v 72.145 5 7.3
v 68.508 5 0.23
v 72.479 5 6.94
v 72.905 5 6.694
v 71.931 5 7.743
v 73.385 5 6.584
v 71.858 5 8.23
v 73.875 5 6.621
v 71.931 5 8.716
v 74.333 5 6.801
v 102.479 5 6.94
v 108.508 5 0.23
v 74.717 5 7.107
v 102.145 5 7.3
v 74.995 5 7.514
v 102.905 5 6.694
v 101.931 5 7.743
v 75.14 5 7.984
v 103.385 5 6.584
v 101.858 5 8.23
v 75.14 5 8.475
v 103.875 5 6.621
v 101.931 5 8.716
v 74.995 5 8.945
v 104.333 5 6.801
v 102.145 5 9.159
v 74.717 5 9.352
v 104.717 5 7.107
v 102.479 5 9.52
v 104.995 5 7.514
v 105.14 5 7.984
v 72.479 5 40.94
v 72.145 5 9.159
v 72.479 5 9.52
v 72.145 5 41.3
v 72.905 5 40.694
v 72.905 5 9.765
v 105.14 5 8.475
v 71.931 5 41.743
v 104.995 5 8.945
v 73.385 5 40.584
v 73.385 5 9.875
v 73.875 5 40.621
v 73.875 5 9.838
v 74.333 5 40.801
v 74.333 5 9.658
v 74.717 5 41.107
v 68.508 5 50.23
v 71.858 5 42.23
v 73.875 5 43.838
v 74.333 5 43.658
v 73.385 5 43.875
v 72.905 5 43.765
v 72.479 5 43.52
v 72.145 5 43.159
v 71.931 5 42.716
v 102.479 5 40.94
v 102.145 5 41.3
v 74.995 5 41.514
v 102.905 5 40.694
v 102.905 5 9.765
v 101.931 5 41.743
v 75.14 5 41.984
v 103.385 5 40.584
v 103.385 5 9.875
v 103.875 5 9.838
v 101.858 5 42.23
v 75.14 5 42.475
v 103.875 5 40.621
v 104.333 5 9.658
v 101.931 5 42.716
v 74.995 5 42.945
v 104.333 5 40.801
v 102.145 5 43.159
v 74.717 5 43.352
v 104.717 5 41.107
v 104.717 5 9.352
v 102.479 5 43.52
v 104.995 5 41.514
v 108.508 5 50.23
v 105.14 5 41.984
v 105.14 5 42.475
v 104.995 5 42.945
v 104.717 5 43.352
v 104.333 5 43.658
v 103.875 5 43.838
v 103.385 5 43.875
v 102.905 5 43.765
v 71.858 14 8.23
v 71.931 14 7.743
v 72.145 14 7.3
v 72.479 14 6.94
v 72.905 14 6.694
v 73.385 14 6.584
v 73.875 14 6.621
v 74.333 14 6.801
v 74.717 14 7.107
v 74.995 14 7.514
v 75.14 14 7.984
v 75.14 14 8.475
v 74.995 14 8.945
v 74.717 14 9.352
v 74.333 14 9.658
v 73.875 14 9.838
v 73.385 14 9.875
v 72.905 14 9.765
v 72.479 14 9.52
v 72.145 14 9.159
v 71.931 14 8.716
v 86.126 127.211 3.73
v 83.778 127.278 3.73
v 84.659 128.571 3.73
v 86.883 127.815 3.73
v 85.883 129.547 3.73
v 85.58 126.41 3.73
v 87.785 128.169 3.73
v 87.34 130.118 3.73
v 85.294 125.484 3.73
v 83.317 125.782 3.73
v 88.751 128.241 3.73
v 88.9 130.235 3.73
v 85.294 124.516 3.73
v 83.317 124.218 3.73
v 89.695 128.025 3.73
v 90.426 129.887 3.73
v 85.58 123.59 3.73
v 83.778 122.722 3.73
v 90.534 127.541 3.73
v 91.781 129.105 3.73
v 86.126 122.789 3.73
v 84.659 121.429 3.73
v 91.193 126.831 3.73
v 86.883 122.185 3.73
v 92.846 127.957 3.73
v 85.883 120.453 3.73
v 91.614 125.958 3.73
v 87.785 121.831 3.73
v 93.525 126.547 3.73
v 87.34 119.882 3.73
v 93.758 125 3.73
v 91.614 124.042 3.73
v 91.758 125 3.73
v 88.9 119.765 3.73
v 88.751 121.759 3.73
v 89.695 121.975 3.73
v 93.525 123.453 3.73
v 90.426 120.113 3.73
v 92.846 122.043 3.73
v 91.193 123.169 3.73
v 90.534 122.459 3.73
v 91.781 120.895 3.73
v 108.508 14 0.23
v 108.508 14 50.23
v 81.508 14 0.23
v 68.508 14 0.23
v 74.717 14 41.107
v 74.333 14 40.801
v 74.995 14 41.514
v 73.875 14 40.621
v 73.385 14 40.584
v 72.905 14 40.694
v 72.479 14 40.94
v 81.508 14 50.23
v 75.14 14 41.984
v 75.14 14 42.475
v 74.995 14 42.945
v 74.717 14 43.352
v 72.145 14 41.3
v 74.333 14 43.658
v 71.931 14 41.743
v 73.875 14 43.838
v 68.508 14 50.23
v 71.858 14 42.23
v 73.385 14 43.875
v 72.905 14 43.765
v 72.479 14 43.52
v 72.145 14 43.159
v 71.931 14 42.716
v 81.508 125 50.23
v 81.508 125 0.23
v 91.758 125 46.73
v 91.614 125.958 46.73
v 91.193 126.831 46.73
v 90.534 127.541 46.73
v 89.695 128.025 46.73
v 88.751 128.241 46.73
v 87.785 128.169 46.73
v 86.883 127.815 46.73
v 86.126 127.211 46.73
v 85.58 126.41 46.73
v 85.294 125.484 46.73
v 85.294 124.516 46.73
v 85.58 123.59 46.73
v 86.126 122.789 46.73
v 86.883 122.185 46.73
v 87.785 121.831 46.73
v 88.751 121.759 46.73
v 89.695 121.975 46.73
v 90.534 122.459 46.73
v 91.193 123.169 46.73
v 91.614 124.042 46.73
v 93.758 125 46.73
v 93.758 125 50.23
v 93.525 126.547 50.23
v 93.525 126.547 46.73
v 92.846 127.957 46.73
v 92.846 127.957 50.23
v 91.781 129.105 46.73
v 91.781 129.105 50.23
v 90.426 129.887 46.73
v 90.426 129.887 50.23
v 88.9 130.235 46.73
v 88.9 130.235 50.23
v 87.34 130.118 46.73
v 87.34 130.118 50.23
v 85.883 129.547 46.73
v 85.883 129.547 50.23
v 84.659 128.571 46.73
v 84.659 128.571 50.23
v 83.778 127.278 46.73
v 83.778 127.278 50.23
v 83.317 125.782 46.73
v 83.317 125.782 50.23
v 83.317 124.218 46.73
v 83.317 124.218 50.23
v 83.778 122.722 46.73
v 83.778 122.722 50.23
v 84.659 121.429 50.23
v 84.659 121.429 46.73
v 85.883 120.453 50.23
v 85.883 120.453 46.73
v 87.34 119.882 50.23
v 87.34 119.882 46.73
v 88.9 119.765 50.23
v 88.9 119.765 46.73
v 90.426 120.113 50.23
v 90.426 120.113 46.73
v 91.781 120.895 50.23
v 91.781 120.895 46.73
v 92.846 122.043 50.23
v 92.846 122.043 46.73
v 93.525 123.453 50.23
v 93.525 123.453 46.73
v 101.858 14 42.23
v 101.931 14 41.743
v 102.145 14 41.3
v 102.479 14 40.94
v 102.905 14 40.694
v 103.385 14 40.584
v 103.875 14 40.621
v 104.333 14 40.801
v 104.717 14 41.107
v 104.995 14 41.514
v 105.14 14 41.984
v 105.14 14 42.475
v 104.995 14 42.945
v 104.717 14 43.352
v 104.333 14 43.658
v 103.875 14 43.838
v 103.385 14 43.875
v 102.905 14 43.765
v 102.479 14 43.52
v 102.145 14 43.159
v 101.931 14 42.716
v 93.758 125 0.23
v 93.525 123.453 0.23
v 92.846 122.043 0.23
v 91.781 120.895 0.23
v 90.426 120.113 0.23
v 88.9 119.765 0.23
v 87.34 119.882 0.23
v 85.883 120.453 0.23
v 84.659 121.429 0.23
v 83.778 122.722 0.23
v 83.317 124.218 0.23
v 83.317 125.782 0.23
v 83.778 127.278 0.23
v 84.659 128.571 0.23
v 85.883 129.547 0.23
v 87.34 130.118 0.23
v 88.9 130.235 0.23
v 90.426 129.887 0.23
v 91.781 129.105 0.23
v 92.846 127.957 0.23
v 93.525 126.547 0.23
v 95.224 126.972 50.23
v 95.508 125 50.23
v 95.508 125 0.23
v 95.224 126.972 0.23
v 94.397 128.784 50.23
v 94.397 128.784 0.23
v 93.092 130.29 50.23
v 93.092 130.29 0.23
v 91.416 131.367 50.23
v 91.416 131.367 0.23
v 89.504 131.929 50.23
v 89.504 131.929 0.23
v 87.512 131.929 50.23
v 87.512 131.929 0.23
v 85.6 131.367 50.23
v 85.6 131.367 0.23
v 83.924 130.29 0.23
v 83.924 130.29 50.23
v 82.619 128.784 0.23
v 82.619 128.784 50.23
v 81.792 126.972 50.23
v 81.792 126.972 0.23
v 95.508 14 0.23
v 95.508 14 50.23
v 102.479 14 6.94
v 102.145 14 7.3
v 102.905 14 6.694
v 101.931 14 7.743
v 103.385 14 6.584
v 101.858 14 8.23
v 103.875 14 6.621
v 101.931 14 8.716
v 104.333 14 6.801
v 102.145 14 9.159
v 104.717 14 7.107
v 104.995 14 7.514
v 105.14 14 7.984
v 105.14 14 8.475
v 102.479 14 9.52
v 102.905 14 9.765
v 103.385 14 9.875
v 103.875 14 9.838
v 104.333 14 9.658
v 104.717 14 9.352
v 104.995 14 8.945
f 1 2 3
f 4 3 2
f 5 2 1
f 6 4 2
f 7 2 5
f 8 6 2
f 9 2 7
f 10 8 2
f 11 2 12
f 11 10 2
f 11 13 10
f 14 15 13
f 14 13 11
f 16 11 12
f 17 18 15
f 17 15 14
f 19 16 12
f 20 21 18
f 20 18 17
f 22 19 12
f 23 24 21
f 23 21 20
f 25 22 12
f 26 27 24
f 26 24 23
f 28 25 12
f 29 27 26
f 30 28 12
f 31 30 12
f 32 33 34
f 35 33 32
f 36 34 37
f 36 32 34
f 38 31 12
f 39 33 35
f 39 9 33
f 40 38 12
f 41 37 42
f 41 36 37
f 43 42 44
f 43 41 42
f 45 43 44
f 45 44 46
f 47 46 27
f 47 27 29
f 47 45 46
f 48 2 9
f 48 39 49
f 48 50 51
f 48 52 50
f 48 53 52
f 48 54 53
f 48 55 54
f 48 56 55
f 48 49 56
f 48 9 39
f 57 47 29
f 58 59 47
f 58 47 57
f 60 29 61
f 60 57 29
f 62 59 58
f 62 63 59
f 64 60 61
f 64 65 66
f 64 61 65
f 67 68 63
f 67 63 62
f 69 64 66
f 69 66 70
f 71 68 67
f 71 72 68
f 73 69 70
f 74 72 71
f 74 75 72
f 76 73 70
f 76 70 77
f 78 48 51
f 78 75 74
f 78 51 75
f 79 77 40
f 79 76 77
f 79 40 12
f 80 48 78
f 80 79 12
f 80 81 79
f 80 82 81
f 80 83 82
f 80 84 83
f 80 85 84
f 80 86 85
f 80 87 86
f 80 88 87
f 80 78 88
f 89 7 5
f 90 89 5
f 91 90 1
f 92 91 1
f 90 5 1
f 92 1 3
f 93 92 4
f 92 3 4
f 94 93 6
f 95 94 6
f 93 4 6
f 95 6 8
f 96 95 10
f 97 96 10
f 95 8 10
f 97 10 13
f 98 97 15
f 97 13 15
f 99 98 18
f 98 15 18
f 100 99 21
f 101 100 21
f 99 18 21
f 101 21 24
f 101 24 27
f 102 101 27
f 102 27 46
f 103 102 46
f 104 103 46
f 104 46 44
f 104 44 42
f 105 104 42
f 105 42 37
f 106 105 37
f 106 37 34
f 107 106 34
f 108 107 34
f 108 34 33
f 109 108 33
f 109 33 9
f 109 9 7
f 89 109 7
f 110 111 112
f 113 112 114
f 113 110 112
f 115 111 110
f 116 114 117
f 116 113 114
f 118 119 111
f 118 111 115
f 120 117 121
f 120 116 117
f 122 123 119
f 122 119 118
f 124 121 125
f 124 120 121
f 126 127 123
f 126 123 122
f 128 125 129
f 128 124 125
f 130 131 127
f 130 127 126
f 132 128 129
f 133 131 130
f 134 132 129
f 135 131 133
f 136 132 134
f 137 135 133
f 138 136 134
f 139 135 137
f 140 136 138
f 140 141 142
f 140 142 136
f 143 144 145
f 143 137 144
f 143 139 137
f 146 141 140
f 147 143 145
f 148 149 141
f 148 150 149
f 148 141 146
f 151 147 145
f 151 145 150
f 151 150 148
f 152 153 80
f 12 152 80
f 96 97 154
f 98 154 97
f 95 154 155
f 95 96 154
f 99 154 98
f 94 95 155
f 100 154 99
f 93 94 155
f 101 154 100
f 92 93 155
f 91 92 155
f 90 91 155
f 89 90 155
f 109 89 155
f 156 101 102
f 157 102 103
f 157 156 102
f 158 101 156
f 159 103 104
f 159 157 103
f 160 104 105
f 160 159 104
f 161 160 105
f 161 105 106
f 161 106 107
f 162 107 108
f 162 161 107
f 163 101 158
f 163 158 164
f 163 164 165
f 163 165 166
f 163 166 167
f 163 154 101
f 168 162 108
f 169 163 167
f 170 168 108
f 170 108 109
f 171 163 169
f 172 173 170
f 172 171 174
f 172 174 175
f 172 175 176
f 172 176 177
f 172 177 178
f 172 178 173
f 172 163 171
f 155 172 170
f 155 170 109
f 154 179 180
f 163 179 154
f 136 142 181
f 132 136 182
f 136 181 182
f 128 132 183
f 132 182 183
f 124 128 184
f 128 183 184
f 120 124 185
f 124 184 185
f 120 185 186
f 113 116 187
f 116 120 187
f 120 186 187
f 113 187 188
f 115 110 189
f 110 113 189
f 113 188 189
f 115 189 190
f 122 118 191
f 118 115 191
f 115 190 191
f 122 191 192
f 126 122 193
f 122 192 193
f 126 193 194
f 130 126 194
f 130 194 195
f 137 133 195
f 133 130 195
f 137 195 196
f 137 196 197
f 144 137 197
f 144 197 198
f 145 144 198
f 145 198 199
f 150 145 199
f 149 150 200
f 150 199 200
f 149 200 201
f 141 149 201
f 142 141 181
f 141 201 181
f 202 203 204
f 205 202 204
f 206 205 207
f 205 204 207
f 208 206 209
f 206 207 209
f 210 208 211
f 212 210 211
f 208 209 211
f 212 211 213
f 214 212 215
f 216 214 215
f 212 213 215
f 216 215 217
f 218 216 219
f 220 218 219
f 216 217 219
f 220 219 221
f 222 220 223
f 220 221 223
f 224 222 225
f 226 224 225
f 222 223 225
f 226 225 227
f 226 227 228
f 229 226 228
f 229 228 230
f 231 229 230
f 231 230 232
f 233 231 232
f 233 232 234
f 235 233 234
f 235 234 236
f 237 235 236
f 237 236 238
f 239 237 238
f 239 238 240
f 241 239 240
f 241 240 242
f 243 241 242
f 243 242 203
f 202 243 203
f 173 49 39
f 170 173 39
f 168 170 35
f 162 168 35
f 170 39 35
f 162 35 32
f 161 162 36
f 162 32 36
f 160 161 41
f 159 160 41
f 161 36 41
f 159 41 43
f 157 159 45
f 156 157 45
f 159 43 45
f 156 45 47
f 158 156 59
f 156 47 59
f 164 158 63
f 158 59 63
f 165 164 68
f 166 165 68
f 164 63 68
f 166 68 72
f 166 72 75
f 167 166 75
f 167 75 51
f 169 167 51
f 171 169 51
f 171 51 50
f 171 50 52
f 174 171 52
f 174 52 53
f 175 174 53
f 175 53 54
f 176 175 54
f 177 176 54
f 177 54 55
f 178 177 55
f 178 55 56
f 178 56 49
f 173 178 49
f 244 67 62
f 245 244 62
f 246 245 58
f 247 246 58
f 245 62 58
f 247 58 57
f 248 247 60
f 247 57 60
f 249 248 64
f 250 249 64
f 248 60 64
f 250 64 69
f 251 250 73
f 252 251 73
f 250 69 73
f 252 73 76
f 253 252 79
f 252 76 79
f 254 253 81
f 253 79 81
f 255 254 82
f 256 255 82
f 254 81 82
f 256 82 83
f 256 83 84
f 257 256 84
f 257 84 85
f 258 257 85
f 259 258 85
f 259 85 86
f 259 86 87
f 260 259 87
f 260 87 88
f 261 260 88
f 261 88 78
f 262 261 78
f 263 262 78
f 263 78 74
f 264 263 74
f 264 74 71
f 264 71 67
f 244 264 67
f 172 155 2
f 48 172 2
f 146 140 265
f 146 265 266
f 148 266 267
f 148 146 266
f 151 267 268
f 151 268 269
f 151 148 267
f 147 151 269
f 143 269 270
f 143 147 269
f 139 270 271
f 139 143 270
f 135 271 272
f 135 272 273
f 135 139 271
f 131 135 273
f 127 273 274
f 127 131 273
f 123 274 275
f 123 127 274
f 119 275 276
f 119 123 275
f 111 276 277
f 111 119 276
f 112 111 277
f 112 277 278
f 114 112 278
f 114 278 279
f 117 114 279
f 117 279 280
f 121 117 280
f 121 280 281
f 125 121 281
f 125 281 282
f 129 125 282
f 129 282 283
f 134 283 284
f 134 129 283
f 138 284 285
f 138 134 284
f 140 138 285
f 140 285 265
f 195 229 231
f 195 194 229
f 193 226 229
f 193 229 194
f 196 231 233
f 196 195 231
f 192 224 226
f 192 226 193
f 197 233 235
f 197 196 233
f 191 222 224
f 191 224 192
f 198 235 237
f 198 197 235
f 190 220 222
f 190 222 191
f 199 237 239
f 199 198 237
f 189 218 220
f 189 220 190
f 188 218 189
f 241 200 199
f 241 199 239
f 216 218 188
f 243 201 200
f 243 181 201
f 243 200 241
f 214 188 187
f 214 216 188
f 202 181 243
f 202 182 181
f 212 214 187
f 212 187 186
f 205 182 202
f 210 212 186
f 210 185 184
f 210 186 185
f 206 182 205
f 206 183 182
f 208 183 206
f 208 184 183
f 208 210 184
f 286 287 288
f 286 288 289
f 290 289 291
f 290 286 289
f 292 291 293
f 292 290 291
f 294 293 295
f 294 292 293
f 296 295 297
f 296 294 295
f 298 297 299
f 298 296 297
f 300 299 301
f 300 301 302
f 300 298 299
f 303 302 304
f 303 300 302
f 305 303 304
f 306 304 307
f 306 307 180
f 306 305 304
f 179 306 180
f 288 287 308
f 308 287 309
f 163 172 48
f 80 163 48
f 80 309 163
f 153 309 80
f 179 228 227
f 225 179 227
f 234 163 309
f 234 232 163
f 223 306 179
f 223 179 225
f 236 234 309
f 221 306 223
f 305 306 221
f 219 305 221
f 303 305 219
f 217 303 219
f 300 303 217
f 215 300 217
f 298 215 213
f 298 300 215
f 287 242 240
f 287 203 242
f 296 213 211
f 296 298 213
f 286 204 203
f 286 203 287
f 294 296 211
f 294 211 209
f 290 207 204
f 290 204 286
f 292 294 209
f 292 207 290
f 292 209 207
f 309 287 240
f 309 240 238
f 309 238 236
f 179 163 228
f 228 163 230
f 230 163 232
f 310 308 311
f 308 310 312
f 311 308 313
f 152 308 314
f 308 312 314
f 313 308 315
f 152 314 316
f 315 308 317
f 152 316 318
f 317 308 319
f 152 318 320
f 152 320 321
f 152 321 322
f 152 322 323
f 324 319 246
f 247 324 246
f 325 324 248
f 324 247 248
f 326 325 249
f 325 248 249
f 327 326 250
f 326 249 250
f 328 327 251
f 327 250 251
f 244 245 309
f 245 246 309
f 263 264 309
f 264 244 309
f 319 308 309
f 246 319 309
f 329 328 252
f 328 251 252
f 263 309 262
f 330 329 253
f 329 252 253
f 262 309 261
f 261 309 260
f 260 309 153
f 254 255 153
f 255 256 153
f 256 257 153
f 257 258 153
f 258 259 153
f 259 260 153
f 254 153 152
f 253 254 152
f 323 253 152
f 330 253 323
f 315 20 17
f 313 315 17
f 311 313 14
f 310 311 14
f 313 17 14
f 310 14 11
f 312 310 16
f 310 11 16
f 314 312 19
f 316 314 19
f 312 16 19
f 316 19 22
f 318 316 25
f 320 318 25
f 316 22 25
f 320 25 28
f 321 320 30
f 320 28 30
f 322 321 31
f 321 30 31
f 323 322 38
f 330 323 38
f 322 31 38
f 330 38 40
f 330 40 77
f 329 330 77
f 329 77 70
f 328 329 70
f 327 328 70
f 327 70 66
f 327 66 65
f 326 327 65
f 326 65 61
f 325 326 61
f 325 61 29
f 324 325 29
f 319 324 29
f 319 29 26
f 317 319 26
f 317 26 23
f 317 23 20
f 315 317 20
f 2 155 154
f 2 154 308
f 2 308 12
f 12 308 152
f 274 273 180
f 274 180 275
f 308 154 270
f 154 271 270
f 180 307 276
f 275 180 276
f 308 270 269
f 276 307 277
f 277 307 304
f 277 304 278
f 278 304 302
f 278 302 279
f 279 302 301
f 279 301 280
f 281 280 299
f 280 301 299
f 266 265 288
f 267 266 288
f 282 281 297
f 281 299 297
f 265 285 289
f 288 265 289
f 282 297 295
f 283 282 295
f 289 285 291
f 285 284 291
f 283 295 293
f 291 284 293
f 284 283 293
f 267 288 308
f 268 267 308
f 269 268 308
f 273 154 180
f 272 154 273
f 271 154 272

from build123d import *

# Parameters (mm, degrees)
SKETCH_2_W               = 240.549430728
SKETCH_2_H               = 149.540933388
EXTRUDE_1_DEPTH          = 5
SKETCH_6_W               = 93.246571425
SKETCH_6_H               = 149.540933388
EXTRUDE_4_DEPTH          = 5
SKETCH_8_W               = 274.716709757
SKETCH_8_H               = 58.51354913
EXTRUDE_6_DEPTH          = 5
CUT_EXTRUDE_2_DEPTH      = 252.755772101
CUT_EXTRUDE_2_DEPTH_BACK = 252.755772101
SKETCH_9_W               = 59.079292396
SKETCH_9_H               = 149.540933388
SKETCH_10_W              = 104.703380117
SKETCH_10_H              = 208.054482518
CUT_EXTRUDE_3_DEPTH      = 10
SKETCH_12_W              = 200
SKETCH_12_H              = 200
EXTRUDE_7_DEPTH          = 5
SKETCH_13_OUTSIDE_W      = 259.728
SKETCH_13_OUTSIDE_H      = 267.782
SKETCH_13_OUTSIDE_W_2    = 200
SKETCH_13_OUTSIDE_H_2    = 200
CUT_EXTRUDE_4_DEPTH      = 278.64321362
EXTRUDE_START            = -75
SKETCH_18_R              = 5.25
EXTRUDE_9_DEPTH          = 10
EXTRUDE_START_2          = -46
EXTRUDE_10_DEPTH         = 15
EXTRUDE_START_3          = -91.2
EXTRUDE_11_DEPTH         = 15
EXTRUDE_12_REACH         = 307.894
SKETCH_20_R              = 5.25
SKETCH_26_W              = 200
SKETCH_26_H              = 5
EXTRUDE_13_DEPTH         = 100
SKETCH_27_W              = 200
SKETCH_27_H              = 5
CUT_EXTRUDE_5_DEPTH      = 30
EXTRUDE_14_DEPTH         = 10
SKETCH_29_W              = 60
SKETCH_29_H              = 9
EXTRUDE_15_DEPTH         = 10
HOLE_WIZARD_M4_1_D       = 3.3
HOLE_WIZARD_M4_2_D       = 3.3
HOLE_WIZARD_M4_3_D       = 3.3
EXTRUDE_16_DEPTH         = 10
SKETCH_37_W              = 60
SKETCH_37_H              = 9
EXTRUDE_17_DEPTH         = 10
HOLE_WIZARD_M4_4_D       = 3.3
EXTRUDE_START_4          = -3.5
SKETCH_40_R              = 5.25
SKETCH_40_R_2            = 3.25
EXTRUDE_18_DEPTH         = 46.5
CUT_EXTRUDE_START        = -3.5
SKETCH_41_R              = 5.25
SKETCH_41_R_2            = 3.25
CUT_EXTRUDE_6_DEPTH      = 3.5
HOLE_WIZARD_M4_5_D       = 3.3
SKETCH_44_W              = 270
SKETCH_44_H              = 5
CUT_EXTRUDE_7_DEPTH      = 400.170489639
CUT_EXTRUDE_8_DEPTH      = 274.053696703
CUT_EXTRUDE_8_DEPTH_BACK = 274.053696703
SKETCH_45_W              = 100.422934587
SKETCH_45_H              = 170.865744653


with BuildPart() as part:
    # 草图2 → 凸台-拉伸1 (new body)
    with BuildSketch(Plane(origin=(0, 0, 0), x_dir=(1, 0, 0), z_dir=(0, 1, 0))):
        Rectangle(SKETCH_2_W, SKETCH_2_H)
    extrude(amount=EXTRUDE_1_DEPTH)

    # 草图6 → 凸台-拉伸4 (add)
    with BuildSketch(Plane(origin=(0, 5, 0), x_dir=(1, 0, 0), z_dir=(0, 1, 0))):
        with Locations((166.898001077, 0)):
            Rectangle(SKETCH_6_W, SKETCH_6_H)
    extrude(amount=-EXTRUDE_4_DEPTH)

    # 草图8 → 凸台-拉伸6 (add)
    with BuildSketch(Plane(origin=(0, 5, 0), x_dir=(1, 0, 0), z_dir=(0, 1, 0))):
        with Locations((76.162931911, -104.027241259)):
            Rectangle(SKETCH_8_W, SKETCH_8_H)
    extrude(amount=-EXTRUDE_6_DEPTH)

    # 草图9 → 切除-拉伸2 (cut, two sides: drawn at the far end of the back side and taken through both)
    with BuildSketch(Plane(origin=(0, 5, 0), x_dir=(1, 0, 0), z_dir=(0, 1, 0)).offset(-CUT_EXTRUDE_2_DEPTH_BACK)):
        with Locations((-90.735069166, 0)):
            Rectangle(SKETCH_9_W, SKETCH_9_H)
    extrude(amount=CUT_EXTRUDE_2_DEPTH + CUT_EXTRUDE_2_DEPTH_BACK, mode=Mode.SUBTRACT)

    # 草图10 → 切除-拉伸3 (cut)
    with BuildSketch(Plane(origin=(0, 5, 0), x_dir=(1, 0, 0), z_dir=(0, 1, 0))):
        with Locations((-8.84373291, -29.256774565)):
            Rectangle(SKETCH_10_W, SKETCH_10_H)
    extrude(amount=-CUT_EXTRUDE_3_DEPTH, mode=Mode.SUBTRACT)

    # 草图12 → 凸台-拉伸7 (add)
    with BuildSketch(Plane(origin=(0, 5, 0), x_dir=(1, 0, 0), z_dir=(0, 1, 0))):
        with Locations((143.507957149, -25.229533306)):
            Rectangle(SKETCH_12_W, SKETCH_12_H)
    extrude(amount=-EXTRUDE_7_DEPTH)

    # 草图13 outside → 切除-拉伸4 (cut, through all)
    with BuildSketch(Plane(origin=(0, 5, 0), x_dir=(1, 0, 0), z_dir=(0, 1, 0))):
        with Locations((143.508, -29.257)):
            Rectangle(SKETCH_13_OUTSIDE_W, SKETCH_13_OUTSIDE_H)
        with Locations((143.507957149, -25.229533306)):
            Rectangle(SKETCH_13_OUTSIDE_W_2, SKETCH_13_OUTSIDE_H_2, mode=Mode.SUBTRACT)
    extrude(amount=-CUT_EXTRUDE_4_DEPTH, mode=Mode.SUBTRACT)

    # 草图18 → 凸台-拉伸9 (add)
    with BuildSketch(Plane.XY.offset(125.229533306).offset(EXTRUDE_START)):
        with BuildLine():
            Line((95.507957149, 14), (95.507957149, 125))
            ThreePointArc((95.507957149, 125), (88.507957149, 132), (81.507957149, 125))
            Line((81.507957149, 125), (81.507957149, 14))
            Line((81.507957149, 14), (68.507957149, 14))
            Line((68.507957149, 14), (68.507957149, 5))
            Line((68.507957149, 5), (108.507957149, 5))
            Line((108.507957149, 5), (108.507957149, 14))
            Line((108.507957149, 14), (95.507957149, 14))
        make_face()
        with Locations((88.507957149, 125)):
            Circle(SKETCH_18_R, mode=Mode.SUBTRACT)
    extrude_9 = extrude(amount=-EXTRUDE_9_DEPTH)

    # 镜向1: 凸台-拉伸9 across plane
    add(extrude_9.mirror(Plane.XY.offset(25.229533306)))

    # 草图16 → 凸台-拉伸10 (add)
    with BuildSketch(Plane(origin=(243.507957149, 0, 0), x_dir=(0, 0, -1), z_dir=(1, 0, 0)).offset(EXTRUDE_START_2)):
        with BuildLine():
            Line((-53.779533306, 14), (-53.779533306, 145.085631965))
            Line((-53.779533306, 145.085631965), (-67.779533306, 145.085631965))
            Line((-67.779533306, 145.085631965), (-67.779533306, 139.085631965))
            ThreePointArc((-67.779533306, 139.085631965), (-69.779533306, 114.75), (-71.779533306, 139.085631965))
            Line((-71.779533306, 139.085631965), (-71.779533306, 145.085631965))
            Line((-71.779533306, 145.085631965), (-85.779533306, 145.085631965))
            Line((-85.779533306, 145.085631965), (-85.779533306, 14))
            Line((-85.779533306, 14), (-99.779533306, 14))
            Line((-99.779533306, 14), (-99.779533306, 5))
            Line((-99.779533306, 5), (-39.779533306, 5))
            Line((-39.779533306, 5), (-39.779533306, 14))
            Line((-39.779533306, 14), (-53.779533306, 14))
        make_face()
    extrude(amount=-EXTRUDE_10_DEPTH)

    # 草图19 → 凸台-拉伸11 (add)
    with BuildSketch(Plane(origin=(243.507957149, 0, 0), x_dir=(0, 0, -1), z_dir=(1, 0, 0)).offset(EXTRUDE_START_3)):
        with BuildLine():
            Line((37.990466694, 14), (37.990466694, 144.933566106))
            Line((37.990466694, 144.933566106), (23.990466694, 144.933566106))
            Line((23.990466694, 144.933566106), (23.990466694, 138.933566106))
            ThreePointArc((23.990466694, 138.933566106), (21.990466694, 114.9), (19.990466694, 138.933566106))
            Line((19.990466694, 138.933566106), (19.990466694, 144.933566106))
            Line((19.990466694, 144.933566106), (5.990466694, 144.933566106))
            Line((5.990466694, 144.933566106), (5.990466694, 14))
            Line((5.990466694, 14), (-8.009533306, 14))
            Line((-8.009533306, 14), (-8.009533306, 5))
            Line((-8.009533306, 5), (51.990466694, 5))
            Line((51.990466694, 5), (51.990466694, 14))
            Line((51.990466694, 14), (37.990466694, 14))
        make_face()
    extrude(amount=-EXTRUDE_11_DEPTH)

    # 草图20 → 凸台-拉伸12 (add, up to next)
    with BuildSketch(Plane(origin=(0, 0, 40.229533306), x_dir=(-1, 0, 0), z_dir=(0, 0, -1)), mode=Mode.PRIVATE) as extrude_12_sk1:
        with BuildLine():
            Line((-108.507957149, 5), (-68.507957149, 5))
            Line((-68.507957149, 5), (-68.507957149, 14))
            Line((-68.507957149, 14), (-81.507957149, 14))
            Line((-81.507957149, 14), (-81.507957149, 125))
            ThreePointArc((-81.507957149, 125), (-88.507957149, 132), (-95.507957149, 125))
            Line((-95.507957149, 125), (-95.507957149, 14))
            Line((-95.507957149, 14), (-108.507957149, 14))
            Line((-108.507957149, 14), (-108.507957149, 5))
        make_face()
        with Locations(Location((-88.507957149, 125, 0), (0, 0, 180))):
            Circle(SKETCH_20_R, mode=Mode.SUBTRACT)
    extrude_12_tool1 = extrude(extrude_12_sk1.sketch, amount=EXTRUDE_12_REACH, mode=Mode.PRIVATE) - part.part
    add(extrude_12_tool1.solids().sort_by_distance((88.507957, 57.997401, 40.229533))[0])

    # 草图26 → 凸台-拉伸13 (add)
    with BuildSketch(Plane(origin=(243.507957149, 0, 0), x_dir=(0, 0, -1), z_dir=(1, 0, 0))):
        with Locations((-25.229533306, 2.5)):
            Rectangle(SKETCH_26_W, SKETCH_26_H)
    extrude(amount=EXTRUDE_13_DEPTH)

    # 草图27 → 切除-拉伸5 (cut)
    with BuildSketch(Plane(origin=(343.507957149, 0, 0), x_dir=(0, 0, -1), z_dir=(1, 0, 0))):
        with Locations((-25.229533306, 2.5)):
            Rectangle(SKETCH_27_W, SKETCH_27_H)
    extrude(amount=-CUT_EXTRUDE_5_DEPTH, mode=Mode.SUBTRACT)

    # 草图28 → 凸台-拉伸14 (add)
    with BuildSketch(Plane(origin=(197.507957149, 0, 0), x_dir=(0, 0, -1), z_dir=(1, 0, 0))):
        Polygon((-85.779533306, 14), (-53.779533306, 14), (-39.779533306, 14), (-39.779533306, 5), (-99.779533306, 5), (-99.779533306, 14), align=None)
    extrude(amount=EXTRUDE_14_DEPTH)

    # 草图29 → 凸台-拉伸15 (add)
    with BuildSketch(Plane.ZY.offset(-182.507957149)):
        with Locations((69.779533306, 9.5)):
            Rectangle(SKETCH_29_W, SKETCH_29_H)
    extrude(amount=EXTRUDE_15_DEPTH)

    # M4 螺纹孔1 (through all)
    with Locations(Plane(origin=(0, 14, 0), x_dir=(1, 0, 0), z_dir=(0, 1, 0))):
        with Locations((178.507957149, -47.779533306), (201.507957149, -47.779533306), (201.507957149, -91.779533306), (178.507957149, -91.779533306)):
            Hole(HOLE_WIZARD_M4_1_D / 2)

    # M4 螺纹孔2 (through all)
    with Locations(Plane.XY.offset(85.779533306)):
        with Locations((190.007957149, 141.085631965)):
            Hole(HOLE_WIZARD_M4_2_D / 2)

    # M4 螺纹孔3 (through all)
    with Locations(Plane.XY.offset(-5.990466694)):
        with Locations((144.807957149, 140.933566106)):
            Hole(HOLE_WIZARD_M4_3_D / 2)

    # 草图36 → 凸台-拉伸16 (add)
    with BuildSketch(Plane(origin=(152.307957149, 0, 0), x_dir=(0, 0, -1), z_dir=(1, 0, 0))):
        Polygon((5.990466694, 14), (37.990466694, 14), (51.990466694, 14), (51.990466694, 5), (-8.009533306, 5), (-8.009533306, 14), align=None)
    extrude(amount=EXTRUDE_16_DEPTH)

    # 草图37 → 凸台-拉伸17 (add)
    with BuildSketch(Plane.ZY.offset(-137.307957149)):
        with Locations((-21.990466694, 9.5)):
            Rectangle(SKETCH_37_W, SKETCH_37_H)
    extrude(amount=EXTRUDE_17_DEPTH)

    # M4 螺纹孔4 (through all)
    with Locations(Plane(origin=(0, 14, 0), x_dir=(1, 0, 0), z_dir=(0, 1, 0))):
        with Locations((133.307957149, 43.990466694), (156.307957149, 43.990466694), (156.307957149, -0.009533306), (133.307957149, -0.009533306)):
            Hole(HOLE_WIZARD_M4_4_D / 2)

    # 草图40 → 凸台-拉伸18 (add)
    with BuildSketch(Plane.XY.offset(50.229533306).offset(EXTRUDE_START_4)):
        with Locations((88.507957149, 125)):
            Circle(SKETCH_40_R)
        with Locations((88.507957149, 125)):
            Circle(SKETCH_40_R_2, mode=Mode.SUBTRACT)
    extrude(amount=-EXTRUDE_18_DEPTH)

    # 草图41 → 切除-拉伸6 (cut)
    with BuildSketch(Plane(origin=(0, 0, 0.229533306), x_dir=(-1, 0, 0), z_dir=(0, 0, -1)).offset(CUT_EXTRUDE_START)):
        with Locations(Location((-88.507957149, 125, 0), (0, 0, 180))):
            Circle(SKETCH_41_R)
        with Locations(Location((-88.507957149, 125, 0), (0, 0, 180))):
            Circle(SKETCH_41_R_2, mode=Mode.SUBTRACT)
    extrude(amount=CUT_EXTRUDE_6_DEPTH, mode=Mode.SUBTRACT)

    # M4 螺纹孔5 (through all)
    with Locations(Plane(origin=(0, 14, 0), x_dir=(1, 0, 0), z_dir=(0, 1, 0))):
        with Locations((73.507957149, -8.229533306), (103.507957149, -8.229533306), (103.507957149, -42.229533306), (73.507957149, -42.229533306)):
            Hole(HOLE_WIZARD_M4_5_D / 2)

    # 草图44 → 切除-拉伸7 (cut, through all)
    with BuildSketch(Plane.XY.offset(125.229533306)):
        with Locations((178.507957149, 2.5)):
            Rectangle(SKETCH_44_W, SKETCH_44_H)
    extrude(amount=-CUT_EXTRUDE_7_DEPTH, mode=Mode.SUBTRACT)


with BuildPart() as cut_extrude_7_piece_1:
    # of the separate pieces the step leaves, piece 1, a body of its own (cut_extrude_7_pieces)
    add(part.part.solids().sort_by_distance((68.507957149, 14, 50.229533306))[0])


with BuildPart() as cut_extrude_7_piece_2:
    # of the separate pieces the step leaves, piece 2, a body of its own (cut_extrude_7_pieces)
    add(part.part.solids().sort_by_distance((127.307957149, 14, 8.009533306))[0])


with BuildPart() as cut_extrude_7_piece_3:
    # of the separate pieces the step leaves, piece 3, a body of its own (cut_extrude_7_pieces)
    add(part.part.solids().sort_by_distance((172.507957149, 14, 99.779533306))[0])


with BuildPart() as cut_extrude_8_tool:
    # 草图45 → 切除-拉伸8 (new, two sides: drawn at the far end of the back side and taken through both)
    with BuildSketch(Plane.XY.offset(50.229533306).offset(-CUT_EXTRUDE_8_DEPTH_BACK)):
        with Locations((168.17278759, 76.071196607)):
            Rectangle(SKETCH_45_W, SKETCH_45_H)
    extrude(amount=CUT_EXTRUDE_8_DEPTH + CUT_EXTRUDE_8_DEPTH_BACK)


with BuildPart() as cut_extrude_7_piece_2_1:
    add(cut_extrude_7_piece_2.part)

    # 切除-拉伸8: cut by cut_extrude_8_tool
    add(cut_extrude_8_tool.part, mode=Mode.SUBTRACT)


with BuildPart() as cut_extrude_7_piece_3_1:
    add(cut_extrude_7_piece_3.part)

    # 切除-拉伸8: cut by cut_extrude_8_tool
    add(cut_extrude_8_tool.part, mode=Mode.SUBTRACT)


solid = cut_extrude_7_piece_1.part
